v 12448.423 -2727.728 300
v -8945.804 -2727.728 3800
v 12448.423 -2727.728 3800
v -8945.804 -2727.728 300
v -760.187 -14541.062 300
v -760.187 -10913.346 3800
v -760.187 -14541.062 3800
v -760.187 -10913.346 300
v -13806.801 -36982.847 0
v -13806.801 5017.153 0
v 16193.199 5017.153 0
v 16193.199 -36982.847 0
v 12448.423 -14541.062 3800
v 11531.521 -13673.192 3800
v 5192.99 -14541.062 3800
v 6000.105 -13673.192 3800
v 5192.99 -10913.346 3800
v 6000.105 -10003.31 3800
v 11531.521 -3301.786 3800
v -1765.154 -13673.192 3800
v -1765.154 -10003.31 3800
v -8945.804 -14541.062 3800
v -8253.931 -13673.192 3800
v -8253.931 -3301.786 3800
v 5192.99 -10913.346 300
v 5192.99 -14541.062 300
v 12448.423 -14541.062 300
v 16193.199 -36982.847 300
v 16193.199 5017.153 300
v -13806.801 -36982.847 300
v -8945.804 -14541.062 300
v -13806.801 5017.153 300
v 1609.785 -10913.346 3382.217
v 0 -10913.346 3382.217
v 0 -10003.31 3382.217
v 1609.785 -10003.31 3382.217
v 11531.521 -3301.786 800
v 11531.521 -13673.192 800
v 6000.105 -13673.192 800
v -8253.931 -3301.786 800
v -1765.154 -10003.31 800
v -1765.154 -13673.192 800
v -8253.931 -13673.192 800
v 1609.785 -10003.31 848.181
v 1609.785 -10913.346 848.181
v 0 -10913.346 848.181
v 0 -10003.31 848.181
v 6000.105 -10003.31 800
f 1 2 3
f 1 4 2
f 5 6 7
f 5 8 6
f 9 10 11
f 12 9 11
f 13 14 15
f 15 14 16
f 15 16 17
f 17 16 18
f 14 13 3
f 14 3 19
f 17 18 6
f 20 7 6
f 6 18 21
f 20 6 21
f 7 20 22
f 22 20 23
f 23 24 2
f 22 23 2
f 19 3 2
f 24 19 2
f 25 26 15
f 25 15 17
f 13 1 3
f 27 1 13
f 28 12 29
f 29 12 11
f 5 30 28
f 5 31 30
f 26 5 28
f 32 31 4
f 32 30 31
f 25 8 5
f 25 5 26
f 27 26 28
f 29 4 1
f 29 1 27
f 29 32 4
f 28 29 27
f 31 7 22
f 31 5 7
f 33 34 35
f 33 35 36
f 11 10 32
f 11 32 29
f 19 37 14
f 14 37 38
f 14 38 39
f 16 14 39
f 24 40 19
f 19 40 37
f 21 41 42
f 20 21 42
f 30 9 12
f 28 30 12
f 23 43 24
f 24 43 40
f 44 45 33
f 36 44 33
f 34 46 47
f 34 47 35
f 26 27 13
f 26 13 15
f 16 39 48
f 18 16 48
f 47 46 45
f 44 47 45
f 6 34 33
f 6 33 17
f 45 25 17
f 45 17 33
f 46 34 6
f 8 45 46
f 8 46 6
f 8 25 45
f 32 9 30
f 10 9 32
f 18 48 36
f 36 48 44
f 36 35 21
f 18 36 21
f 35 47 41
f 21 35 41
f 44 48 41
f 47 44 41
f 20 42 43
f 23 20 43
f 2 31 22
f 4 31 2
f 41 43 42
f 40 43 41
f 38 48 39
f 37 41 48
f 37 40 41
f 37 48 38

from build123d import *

# Parameters (mm, degrees)
IZIM1_W                     = 30000
IZIM1_H                     = 42000
Y_KSEKLIK_EKSTR_ZYON1_DEPTH = 300
Y_KSEKLIK_EKSTR_ZYON2_DEPTH = 800
Y_KSEKLIK_EKSTR_ZYON4_DEPTH = 3000
IZIM4_W                     = 1609.784824537
IZIM4_H                     = 2534.03541531
KES_EKSTR_ZYON1_DEPTH       = 2062


with BuildPart() as part:
    # Çizim1 → Yükseklik-Ekstrüzyon1 (new body)
    with BuildSketch(Plane.XY):
        with Locations((1193.199328836, -15982.847341338)):
            Rectangle(IZIM1_W, IZIM1_H)
    extrude(amount=Y_KSEKLIK_EKSTR_ZYON1_DEPTH)

    # Çizim2 → Yükseklik-Ekstrüzyon2 (add)
    with BuildSketch(Plane.XY):
        Polygon((-8945.803973005, -14541.06246814), (-760.186628399, -14541.06246814), (-760.186628399, -10913.345690417), (5192.989622223, -10913.345690417), (5192.989622223, -14541.06246814), (12448.423177669, -14541.06246814), (12448.423177669, -2727.728345812), (-8945.803973005, -2727.728345812), align=None)
    extrude(amount=Y_KSEKLIK_EKSTR_ZYON2_DEPTH)

    # Çizim3 → Yükseklik-Ekstrüzyon4 (add)
    with BuildSketch(Plane.XY.offset(800)):
        Polygon((-8945.803973005, -2727.728345812), (12448.423177669, -2727.728345812), (12448.423177669, -14541.06246814), (5192.989622223, -14541.06246814), (5192.989622223, -10913.345690417), (-760.186628399, -10913.345690417), (-760.186628399, -14541.06246814), (-8945.803973005, -14541.06246814), align=None)
        Polygon((-8253.930968423, -3301.785557638), (11531.521366561, -3301.785557638), (11531.521366561, -13673.192023557), (6000.104584738, -13673.192023557), (6000.104584738, -10003.309735616), (-1765.153589745, -10003.309735616), (-1765.153589745, -13673.192023557), (-8253.930968423, -13673.192023557), align=None, mode=Mode.SUBTRACT)
    extrude(amount=Y_KSEKLIK_EKSTR_ZYON4_DEPTH)

    # Çizim4 → Kes-Ekstrüzyon1 (cut)
    with BuildSketch(Plane.XZ.offset(10913.345690417)):
        with Locations((804.892412269, 2115.198946394)):
            Rectangle(IZIM4_W, IZIM4_H)
    extrude(amount=-KES_EKSTR_ZYON1_DEPTH, mode=Mode.SUBTRACT)


solid = part.part
